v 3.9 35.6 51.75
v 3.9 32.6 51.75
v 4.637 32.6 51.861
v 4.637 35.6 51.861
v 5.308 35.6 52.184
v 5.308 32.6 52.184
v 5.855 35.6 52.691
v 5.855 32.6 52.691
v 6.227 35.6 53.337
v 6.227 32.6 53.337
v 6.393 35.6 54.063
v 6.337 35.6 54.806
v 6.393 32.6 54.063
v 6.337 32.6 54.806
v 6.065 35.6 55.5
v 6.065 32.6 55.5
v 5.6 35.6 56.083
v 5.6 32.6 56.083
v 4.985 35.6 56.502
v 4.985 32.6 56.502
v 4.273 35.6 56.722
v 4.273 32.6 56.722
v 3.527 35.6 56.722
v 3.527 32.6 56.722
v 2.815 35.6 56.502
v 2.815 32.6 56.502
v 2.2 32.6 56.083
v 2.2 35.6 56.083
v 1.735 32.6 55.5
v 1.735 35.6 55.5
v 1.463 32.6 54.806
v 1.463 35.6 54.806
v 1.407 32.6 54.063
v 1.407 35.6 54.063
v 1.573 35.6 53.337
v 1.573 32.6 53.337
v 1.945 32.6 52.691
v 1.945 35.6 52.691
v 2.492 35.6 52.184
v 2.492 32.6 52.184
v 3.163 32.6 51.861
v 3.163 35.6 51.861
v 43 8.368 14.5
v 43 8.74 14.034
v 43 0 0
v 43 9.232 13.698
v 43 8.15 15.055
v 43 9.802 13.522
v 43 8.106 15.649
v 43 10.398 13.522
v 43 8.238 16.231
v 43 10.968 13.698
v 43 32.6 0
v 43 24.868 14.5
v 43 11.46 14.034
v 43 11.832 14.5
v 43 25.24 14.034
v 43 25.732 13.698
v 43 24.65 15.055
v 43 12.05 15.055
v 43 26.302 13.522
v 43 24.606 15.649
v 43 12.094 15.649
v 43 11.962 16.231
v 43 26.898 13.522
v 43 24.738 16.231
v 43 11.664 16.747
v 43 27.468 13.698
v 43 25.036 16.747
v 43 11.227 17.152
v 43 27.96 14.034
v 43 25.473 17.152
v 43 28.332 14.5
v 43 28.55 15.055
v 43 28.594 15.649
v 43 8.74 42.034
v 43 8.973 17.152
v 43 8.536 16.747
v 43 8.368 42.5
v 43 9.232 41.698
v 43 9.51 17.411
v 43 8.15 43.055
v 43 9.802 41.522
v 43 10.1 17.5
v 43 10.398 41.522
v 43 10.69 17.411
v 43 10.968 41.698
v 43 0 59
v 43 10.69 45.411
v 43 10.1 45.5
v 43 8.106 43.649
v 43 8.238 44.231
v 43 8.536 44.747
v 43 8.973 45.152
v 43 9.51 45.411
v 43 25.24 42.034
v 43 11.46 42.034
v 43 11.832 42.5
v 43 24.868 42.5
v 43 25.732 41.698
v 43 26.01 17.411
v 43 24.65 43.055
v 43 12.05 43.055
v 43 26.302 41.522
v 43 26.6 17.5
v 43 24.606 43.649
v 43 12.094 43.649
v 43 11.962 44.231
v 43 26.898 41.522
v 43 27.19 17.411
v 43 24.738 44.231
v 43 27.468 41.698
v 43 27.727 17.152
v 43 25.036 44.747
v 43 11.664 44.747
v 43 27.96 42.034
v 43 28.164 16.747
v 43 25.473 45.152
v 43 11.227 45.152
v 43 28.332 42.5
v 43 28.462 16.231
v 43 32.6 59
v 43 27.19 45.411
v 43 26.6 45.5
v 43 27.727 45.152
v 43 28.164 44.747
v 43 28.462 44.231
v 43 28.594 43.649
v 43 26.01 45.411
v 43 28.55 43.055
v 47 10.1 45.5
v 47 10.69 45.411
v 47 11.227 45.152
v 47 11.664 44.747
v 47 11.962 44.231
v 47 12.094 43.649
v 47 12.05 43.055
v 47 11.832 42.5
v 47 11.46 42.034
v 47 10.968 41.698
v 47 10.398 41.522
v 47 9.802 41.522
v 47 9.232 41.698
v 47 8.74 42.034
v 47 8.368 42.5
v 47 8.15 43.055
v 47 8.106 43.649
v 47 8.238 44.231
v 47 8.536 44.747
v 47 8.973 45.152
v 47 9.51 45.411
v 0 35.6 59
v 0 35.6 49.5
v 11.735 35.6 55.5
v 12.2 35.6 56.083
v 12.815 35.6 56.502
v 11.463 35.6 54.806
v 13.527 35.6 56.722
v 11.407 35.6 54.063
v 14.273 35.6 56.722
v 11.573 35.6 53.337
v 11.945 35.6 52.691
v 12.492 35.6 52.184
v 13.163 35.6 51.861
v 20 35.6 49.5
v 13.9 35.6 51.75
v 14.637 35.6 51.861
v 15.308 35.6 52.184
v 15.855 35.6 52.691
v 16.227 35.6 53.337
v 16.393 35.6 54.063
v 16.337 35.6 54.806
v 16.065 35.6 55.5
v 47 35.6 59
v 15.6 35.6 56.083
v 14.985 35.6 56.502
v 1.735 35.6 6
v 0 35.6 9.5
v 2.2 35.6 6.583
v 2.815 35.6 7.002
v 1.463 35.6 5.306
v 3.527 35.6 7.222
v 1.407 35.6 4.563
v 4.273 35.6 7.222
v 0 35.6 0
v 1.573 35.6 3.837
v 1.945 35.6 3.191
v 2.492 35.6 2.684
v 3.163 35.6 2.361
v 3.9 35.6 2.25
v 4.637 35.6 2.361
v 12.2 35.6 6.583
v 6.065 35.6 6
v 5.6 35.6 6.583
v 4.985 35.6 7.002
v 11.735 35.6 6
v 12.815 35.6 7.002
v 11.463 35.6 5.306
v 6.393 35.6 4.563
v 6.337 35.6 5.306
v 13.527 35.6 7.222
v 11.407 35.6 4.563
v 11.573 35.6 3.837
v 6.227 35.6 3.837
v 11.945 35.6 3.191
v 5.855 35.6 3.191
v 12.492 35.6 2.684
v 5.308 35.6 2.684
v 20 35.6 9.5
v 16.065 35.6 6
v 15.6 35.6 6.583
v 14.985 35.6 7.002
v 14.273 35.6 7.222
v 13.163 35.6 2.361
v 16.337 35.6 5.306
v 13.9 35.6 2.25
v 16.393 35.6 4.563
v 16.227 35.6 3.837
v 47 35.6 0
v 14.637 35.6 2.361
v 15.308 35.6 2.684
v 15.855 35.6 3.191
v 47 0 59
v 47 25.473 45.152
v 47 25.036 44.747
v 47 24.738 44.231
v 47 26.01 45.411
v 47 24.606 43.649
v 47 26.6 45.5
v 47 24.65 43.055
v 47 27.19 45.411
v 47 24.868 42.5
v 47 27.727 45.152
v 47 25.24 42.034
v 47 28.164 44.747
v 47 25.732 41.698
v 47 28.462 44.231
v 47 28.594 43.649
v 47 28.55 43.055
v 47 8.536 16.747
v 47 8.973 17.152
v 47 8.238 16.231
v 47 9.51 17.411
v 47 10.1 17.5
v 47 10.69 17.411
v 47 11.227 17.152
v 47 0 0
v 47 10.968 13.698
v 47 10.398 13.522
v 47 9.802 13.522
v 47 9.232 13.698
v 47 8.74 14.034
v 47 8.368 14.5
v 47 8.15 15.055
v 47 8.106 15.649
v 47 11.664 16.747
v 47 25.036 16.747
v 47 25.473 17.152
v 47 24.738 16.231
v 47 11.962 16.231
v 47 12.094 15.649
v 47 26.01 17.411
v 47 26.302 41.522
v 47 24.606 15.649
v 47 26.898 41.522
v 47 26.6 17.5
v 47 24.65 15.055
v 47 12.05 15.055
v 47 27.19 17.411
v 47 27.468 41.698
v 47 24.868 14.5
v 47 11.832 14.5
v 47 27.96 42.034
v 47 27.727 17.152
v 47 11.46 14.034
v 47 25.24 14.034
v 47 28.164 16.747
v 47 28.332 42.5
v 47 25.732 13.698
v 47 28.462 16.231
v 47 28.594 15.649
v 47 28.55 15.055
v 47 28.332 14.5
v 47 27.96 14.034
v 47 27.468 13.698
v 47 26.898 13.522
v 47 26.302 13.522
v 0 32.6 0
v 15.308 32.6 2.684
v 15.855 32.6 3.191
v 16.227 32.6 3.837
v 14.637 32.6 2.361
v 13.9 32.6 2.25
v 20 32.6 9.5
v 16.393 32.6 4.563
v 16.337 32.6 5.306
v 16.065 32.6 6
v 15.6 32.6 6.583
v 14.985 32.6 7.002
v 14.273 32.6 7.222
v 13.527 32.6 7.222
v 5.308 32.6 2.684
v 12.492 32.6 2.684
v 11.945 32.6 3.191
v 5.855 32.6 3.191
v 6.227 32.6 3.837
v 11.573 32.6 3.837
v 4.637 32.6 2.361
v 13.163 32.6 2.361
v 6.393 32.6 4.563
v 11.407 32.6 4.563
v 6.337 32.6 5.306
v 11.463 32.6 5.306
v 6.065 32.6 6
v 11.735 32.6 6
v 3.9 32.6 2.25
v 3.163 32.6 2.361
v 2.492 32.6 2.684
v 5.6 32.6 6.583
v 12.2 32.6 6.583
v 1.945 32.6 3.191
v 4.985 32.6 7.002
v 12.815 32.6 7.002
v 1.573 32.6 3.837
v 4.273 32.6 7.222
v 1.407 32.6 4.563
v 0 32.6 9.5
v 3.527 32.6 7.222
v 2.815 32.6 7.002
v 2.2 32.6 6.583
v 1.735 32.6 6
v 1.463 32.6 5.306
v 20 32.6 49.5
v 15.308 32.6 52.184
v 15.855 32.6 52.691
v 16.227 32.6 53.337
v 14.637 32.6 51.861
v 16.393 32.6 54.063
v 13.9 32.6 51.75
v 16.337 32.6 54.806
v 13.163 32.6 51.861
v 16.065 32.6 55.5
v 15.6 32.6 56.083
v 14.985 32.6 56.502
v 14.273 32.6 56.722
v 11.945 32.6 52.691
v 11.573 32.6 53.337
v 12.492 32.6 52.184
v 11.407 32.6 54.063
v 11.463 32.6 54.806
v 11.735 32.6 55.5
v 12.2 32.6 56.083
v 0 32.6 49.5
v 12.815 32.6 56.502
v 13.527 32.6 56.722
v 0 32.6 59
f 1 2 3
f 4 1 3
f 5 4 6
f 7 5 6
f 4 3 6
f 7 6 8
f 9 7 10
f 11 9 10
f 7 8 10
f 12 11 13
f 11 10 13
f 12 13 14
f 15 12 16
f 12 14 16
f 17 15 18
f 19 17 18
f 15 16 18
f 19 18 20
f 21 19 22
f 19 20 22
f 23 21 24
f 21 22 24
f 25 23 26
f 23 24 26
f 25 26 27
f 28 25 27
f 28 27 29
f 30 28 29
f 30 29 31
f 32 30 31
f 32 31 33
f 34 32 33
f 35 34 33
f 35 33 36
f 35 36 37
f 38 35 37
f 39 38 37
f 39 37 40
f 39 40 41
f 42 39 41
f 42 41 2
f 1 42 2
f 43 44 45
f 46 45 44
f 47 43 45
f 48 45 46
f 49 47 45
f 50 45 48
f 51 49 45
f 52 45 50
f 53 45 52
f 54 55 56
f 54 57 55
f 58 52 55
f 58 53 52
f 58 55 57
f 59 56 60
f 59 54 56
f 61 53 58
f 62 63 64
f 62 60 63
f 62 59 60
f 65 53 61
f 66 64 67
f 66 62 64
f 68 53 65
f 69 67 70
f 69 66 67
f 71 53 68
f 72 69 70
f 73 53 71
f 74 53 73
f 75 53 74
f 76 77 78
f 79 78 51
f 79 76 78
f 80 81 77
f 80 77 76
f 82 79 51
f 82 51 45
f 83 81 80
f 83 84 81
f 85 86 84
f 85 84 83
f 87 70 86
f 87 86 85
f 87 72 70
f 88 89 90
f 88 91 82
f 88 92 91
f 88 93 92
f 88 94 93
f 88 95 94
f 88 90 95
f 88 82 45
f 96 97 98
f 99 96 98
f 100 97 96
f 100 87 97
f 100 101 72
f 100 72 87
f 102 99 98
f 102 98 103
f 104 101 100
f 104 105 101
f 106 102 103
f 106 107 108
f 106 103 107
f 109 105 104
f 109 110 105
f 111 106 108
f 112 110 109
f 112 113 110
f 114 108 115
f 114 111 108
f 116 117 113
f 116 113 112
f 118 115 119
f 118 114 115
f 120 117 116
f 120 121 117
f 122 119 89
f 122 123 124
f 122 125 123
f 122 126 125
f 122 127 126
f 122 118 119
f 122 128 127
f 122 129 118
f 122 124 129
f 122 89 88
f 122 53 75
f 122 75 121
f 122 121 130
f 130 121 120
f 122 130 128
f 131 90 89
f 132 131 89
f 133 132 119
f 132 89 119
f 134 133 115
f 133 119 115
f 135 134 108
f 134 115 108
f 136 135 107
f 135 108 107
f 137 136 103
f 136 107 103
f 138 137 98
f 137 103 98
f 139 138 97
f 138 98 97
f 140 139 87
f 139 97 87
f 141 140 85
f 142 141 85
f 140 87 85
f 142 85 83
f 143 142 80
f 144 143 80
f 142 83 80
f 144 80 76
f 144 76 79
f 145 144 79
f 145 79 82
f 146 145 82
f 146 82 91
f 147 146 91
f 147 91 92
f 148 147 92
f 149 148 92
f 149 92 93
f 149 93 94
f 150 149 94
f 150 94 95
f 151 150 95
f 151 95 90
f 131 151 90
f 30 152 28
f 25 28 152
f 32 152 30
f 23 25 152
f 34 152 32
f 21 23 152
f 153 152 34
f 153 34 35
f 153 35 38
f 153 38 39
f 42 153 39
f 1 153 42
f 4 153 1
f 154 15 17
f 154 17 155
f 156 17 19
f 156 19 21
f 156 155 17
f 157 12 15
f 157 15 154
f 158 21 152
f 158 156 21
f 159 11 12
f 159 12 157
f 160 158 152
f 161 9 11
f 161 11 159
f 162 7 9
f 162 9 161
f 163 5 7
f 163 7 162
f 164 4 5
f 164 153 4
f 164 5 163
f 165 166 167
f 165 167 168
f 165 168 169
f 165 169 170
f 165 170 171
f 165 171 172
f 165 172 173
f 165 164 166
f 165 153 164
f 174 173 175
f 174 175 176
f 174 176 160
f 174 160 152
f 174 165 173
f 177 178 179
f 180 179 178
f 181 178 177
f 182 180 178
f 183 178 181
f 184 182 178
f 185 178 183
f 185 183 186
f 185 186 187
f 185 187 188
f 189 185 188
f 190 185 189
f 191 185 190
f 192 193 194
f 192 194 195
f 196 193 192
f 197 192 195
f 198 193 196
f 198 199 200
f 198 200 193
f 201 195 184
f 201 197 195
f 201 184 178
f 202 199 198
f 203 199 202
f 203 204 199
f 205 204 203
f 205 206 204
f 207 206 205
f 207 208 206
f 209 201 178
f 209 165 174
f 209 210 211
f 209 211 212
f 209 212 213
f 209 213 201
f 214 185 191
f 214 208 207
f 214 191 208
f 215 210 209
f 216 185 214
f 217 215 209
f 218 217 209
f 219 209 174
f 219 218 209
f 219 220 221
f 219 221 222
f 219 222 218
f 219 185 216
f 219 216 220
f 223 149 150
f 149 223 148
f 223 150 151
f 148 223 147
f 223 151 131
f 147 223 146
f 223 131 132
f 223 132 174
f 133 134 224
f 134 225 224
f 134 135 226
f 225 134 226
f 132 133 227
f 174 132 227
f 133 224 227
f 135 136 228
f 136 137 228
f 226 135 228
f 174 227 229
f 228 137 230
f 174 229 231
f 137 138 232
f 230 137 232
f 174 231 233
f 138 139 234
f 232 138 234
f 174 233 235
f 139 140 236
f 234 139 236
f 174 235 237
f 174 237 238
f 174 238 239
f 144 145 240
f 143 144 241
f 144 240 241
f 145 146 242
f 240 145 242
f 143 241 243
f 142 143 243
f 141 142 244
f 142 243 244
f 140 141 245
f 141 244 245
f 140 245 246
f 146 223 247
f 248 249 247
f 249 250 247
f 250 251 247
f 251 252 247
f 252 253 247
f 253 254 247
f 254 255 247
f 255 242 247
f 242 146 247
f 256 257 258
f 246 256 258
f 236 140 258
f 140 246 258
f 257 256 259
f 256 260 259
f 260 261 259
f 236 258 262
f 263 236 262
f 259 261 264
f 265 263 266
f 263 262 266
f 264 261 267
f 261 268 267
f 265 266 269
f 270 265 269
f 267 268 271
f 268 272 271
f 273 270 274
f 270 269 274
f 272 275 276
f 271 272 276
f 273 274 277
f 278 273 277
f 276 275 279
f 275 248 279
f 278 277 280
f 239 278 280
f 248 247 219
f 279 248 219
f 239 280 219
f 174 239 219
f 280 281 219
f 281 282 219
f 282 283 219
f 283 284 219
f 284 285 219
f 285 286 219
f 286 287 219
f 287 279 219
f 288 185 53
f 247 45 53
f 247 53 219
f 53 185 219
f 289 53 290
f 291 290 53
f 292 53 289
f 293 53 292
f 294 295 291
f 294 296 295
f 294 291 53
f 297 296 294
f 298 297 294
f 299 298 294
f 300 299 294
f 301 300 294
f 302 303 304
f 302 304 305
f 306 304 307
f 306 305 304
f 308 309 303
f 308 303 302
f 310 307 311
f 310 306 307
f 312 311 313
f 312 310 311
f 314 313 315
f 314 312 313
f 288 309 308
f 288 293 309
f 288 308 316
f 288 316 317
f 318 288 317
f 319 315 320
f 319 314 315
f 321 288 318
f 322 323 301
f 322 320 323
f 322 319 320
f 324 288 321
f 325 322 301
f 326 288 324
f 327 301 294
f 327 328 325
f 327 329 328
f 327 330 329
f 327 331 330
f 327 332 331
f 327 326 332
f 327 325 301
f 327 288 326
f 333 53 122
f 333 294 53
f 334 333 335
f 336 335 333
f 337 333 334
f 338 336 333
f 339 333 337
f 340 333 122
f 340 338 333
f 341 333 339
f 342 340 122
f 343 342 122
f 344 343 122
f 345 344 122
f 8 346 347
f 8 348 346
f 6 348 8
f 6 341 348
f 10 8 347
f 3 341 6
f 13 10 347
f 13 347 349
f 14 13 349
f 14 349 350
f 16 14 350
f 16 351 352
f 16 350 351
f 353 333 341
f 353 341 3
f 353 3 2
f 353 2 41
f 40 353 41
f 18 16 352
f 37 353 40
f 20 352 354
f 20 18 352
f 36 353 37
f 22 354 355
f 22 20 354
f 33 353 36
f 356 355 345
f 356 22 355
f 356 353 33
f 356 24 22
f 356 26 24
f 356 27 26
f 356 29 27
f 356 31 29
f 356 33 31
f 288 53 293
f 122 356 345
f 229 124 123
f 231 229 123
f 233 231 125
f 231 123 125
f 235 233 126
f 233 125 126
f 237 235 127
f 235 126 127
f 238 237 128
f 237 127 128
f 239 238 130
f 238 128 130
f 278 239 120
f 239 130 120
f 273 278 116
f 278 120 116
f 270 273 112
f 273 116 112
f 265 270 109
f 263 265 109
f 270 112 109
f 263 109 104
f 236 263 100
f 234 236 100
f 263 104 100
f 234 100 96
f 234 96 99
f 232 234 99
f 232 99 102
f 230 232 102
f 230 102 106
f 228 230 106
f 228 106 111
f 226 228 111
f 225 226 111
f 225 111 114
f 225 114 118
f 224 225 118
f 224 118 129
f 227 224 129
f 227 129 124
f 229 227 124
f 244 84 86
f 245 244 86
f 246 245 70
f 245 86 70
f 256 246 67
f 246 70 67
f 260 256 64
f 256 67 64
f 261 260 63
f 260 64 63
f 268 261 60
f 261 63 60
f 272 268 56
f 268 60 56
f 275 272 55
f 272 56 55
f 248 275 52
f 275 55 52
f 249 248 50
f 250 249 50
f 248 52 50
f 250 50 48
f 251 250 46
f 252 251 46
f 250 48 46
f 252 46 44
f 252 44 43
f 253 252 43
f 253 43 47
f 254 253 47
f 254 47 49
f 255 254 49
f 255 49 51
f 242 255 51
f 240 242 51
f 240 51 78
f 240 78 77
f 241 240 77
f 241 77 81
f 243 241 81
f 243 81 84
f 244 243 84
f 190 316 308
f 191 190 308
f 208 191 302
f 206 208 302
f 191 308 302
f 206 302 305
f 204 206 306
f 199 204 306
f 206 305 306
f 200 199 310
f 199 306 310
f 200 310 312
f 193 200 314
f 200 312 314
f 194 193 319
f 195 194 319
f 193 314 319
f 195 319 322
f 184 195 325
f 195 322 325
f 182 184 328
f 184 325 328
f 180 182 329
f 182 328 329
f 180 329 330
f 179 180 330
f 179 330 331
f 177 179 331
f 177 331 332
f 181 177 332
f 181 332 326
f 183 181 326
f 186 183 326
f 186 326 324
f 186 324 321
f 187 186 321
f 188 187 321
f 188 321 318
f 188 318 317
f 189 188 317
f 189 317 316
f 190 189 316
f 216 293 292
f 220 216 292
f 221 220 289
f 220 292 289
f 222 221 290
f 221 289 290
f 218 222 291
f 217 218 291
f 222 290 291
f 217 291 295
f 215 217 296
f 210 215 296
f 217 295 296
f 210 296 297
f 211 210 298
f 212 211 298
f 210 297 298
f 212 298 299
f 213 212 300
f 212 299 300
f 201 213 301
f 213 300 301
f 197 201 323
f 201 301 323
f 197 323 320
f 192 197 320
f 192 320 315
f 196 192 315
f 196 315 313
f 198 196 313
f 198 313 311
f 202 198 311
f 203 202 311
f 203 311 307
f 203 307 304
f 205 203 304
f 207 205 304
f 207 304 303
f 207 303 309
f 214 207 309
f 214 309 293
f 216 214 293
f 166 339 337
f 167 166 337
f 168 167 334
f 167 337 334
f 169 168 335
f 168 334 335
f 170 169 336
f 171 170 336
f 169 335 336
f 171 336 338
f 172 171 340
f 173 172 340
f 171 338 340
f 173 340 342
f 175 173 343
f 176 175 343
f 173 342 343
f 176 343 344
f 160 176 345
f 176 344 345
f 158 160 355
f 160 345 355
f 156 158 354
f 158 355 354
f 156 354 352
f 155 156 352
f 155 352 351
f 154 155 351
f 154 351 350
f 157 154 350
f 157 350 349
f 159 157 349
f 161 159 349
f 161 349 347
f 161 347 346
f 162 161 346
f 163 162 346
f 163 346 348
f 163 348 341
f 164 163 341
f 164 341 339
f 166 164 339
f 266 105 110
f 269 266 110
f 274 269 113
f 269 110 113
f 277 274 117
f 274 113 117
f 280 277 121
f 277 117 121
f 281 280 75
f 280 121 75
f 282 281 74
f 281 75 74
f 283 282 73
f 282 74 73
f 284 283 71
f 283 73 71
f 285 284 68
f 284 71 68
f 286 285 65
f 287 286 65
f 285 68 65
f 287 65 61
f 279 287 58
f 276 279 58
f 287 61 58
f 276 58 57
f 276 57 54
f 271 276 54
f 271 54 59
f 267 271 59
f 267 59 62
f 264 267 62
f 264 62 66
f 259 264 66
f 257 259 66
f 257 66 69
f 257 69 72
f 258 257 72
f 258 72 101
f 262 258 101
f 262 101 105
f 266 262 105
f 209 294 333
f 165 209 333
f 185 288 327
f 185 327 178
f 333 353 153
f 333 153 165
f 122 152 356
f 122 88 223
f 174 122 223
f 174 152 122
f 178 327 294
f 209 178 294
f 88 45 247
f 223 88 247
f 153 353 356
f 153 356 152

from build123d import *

# Parameters (mm, degrees)
SKETCH_1_W          = 47
SKETCH_1_H          = 35.6
EXTRUDE_1_DEPTH     = 59
SKETCH_3_W          = 59
SKETCH_3_H          = 32.6
CUT_EXTRUDE_1_DEPTH = 43
SKETCH_4_R          = 2.5
SKETCH_4_W          = 20
SKETCH_4_H          = 40
CUT_EXTRUDE_2_DEPTH = 49
SKETCH_6_R          = 2
CUT_EXTRUDE_3_DEPTH = 10


with BuildPart() as part:
    # 草图1 → 凸台-拉伸1 (new body)
    with BuildSketch(Plane.XY):
        with Locations((23.5, 17.8)):
            Rectangle(SKETCH_1_W, SKETCH_1_H)
    extrude(amount=EXTRUDE_1_DEPTH)

    # 草图3 → 切除-拉伸1 (cut)
    with BuildSketch(Plane.ZY):
        with Locations((29.5, 16.3)):
            Rectangle(SKETCH_3_W, SKETCH_3_H)
    extrude(amount=-CUT_EXTRUDE_1_DEPTH, mode=Mode.SUBTRACT)

    # 草图4 → 切除-拉伸2 (cut)
    with BuildSketch(Plane.XZ.offset(-32.6)):
        with Locations(Location((3.9, 54.25, 0), (0, 0, 270))):
            Circle(SKETCH_4_R)
        with Locations(Location((13.9, 54.25, 0), (0, 0, 270))):
            Circle(SKETCH_4_R)
        with Locations(Location((13.9, 4.75, 0), (0, 0, 270))):
            Circle(SKETCH_4_R)
        with Locations(Location((3.9, 4.75, 0), (0, 0, 270))):
            Circle(SKETCH_4_R)
        with Locations((10, 29.5)):
            Rectangle(SKETCH_4_W, SKETCH_4_H)
    extrude(amount=-CUT_EXTRUDE_2_DEPTH, mode=Mode.SUBTRACT)

    # 草图6 → 切除-拉伸3 (cut)
    with BuildSketch(Plane.ZY.offset(-43)):
        with Locations((43.5, 26.6)):
            Circle(SKETCH_6_R)
        with Locations((15.5, 26.6)):
            Circle(SKETCH_6_R)
        with Locations((43.5, 10.1)):
            Circle(SKETCH_6_R)
        with Locations((15.5, 10.1)):
            Circle(SKETCH_6_R)
    extrude(amount=-CUT_EXTRUDE_3_DEPTH, mode=Mode.SUBTRACT)


solid = part.part
